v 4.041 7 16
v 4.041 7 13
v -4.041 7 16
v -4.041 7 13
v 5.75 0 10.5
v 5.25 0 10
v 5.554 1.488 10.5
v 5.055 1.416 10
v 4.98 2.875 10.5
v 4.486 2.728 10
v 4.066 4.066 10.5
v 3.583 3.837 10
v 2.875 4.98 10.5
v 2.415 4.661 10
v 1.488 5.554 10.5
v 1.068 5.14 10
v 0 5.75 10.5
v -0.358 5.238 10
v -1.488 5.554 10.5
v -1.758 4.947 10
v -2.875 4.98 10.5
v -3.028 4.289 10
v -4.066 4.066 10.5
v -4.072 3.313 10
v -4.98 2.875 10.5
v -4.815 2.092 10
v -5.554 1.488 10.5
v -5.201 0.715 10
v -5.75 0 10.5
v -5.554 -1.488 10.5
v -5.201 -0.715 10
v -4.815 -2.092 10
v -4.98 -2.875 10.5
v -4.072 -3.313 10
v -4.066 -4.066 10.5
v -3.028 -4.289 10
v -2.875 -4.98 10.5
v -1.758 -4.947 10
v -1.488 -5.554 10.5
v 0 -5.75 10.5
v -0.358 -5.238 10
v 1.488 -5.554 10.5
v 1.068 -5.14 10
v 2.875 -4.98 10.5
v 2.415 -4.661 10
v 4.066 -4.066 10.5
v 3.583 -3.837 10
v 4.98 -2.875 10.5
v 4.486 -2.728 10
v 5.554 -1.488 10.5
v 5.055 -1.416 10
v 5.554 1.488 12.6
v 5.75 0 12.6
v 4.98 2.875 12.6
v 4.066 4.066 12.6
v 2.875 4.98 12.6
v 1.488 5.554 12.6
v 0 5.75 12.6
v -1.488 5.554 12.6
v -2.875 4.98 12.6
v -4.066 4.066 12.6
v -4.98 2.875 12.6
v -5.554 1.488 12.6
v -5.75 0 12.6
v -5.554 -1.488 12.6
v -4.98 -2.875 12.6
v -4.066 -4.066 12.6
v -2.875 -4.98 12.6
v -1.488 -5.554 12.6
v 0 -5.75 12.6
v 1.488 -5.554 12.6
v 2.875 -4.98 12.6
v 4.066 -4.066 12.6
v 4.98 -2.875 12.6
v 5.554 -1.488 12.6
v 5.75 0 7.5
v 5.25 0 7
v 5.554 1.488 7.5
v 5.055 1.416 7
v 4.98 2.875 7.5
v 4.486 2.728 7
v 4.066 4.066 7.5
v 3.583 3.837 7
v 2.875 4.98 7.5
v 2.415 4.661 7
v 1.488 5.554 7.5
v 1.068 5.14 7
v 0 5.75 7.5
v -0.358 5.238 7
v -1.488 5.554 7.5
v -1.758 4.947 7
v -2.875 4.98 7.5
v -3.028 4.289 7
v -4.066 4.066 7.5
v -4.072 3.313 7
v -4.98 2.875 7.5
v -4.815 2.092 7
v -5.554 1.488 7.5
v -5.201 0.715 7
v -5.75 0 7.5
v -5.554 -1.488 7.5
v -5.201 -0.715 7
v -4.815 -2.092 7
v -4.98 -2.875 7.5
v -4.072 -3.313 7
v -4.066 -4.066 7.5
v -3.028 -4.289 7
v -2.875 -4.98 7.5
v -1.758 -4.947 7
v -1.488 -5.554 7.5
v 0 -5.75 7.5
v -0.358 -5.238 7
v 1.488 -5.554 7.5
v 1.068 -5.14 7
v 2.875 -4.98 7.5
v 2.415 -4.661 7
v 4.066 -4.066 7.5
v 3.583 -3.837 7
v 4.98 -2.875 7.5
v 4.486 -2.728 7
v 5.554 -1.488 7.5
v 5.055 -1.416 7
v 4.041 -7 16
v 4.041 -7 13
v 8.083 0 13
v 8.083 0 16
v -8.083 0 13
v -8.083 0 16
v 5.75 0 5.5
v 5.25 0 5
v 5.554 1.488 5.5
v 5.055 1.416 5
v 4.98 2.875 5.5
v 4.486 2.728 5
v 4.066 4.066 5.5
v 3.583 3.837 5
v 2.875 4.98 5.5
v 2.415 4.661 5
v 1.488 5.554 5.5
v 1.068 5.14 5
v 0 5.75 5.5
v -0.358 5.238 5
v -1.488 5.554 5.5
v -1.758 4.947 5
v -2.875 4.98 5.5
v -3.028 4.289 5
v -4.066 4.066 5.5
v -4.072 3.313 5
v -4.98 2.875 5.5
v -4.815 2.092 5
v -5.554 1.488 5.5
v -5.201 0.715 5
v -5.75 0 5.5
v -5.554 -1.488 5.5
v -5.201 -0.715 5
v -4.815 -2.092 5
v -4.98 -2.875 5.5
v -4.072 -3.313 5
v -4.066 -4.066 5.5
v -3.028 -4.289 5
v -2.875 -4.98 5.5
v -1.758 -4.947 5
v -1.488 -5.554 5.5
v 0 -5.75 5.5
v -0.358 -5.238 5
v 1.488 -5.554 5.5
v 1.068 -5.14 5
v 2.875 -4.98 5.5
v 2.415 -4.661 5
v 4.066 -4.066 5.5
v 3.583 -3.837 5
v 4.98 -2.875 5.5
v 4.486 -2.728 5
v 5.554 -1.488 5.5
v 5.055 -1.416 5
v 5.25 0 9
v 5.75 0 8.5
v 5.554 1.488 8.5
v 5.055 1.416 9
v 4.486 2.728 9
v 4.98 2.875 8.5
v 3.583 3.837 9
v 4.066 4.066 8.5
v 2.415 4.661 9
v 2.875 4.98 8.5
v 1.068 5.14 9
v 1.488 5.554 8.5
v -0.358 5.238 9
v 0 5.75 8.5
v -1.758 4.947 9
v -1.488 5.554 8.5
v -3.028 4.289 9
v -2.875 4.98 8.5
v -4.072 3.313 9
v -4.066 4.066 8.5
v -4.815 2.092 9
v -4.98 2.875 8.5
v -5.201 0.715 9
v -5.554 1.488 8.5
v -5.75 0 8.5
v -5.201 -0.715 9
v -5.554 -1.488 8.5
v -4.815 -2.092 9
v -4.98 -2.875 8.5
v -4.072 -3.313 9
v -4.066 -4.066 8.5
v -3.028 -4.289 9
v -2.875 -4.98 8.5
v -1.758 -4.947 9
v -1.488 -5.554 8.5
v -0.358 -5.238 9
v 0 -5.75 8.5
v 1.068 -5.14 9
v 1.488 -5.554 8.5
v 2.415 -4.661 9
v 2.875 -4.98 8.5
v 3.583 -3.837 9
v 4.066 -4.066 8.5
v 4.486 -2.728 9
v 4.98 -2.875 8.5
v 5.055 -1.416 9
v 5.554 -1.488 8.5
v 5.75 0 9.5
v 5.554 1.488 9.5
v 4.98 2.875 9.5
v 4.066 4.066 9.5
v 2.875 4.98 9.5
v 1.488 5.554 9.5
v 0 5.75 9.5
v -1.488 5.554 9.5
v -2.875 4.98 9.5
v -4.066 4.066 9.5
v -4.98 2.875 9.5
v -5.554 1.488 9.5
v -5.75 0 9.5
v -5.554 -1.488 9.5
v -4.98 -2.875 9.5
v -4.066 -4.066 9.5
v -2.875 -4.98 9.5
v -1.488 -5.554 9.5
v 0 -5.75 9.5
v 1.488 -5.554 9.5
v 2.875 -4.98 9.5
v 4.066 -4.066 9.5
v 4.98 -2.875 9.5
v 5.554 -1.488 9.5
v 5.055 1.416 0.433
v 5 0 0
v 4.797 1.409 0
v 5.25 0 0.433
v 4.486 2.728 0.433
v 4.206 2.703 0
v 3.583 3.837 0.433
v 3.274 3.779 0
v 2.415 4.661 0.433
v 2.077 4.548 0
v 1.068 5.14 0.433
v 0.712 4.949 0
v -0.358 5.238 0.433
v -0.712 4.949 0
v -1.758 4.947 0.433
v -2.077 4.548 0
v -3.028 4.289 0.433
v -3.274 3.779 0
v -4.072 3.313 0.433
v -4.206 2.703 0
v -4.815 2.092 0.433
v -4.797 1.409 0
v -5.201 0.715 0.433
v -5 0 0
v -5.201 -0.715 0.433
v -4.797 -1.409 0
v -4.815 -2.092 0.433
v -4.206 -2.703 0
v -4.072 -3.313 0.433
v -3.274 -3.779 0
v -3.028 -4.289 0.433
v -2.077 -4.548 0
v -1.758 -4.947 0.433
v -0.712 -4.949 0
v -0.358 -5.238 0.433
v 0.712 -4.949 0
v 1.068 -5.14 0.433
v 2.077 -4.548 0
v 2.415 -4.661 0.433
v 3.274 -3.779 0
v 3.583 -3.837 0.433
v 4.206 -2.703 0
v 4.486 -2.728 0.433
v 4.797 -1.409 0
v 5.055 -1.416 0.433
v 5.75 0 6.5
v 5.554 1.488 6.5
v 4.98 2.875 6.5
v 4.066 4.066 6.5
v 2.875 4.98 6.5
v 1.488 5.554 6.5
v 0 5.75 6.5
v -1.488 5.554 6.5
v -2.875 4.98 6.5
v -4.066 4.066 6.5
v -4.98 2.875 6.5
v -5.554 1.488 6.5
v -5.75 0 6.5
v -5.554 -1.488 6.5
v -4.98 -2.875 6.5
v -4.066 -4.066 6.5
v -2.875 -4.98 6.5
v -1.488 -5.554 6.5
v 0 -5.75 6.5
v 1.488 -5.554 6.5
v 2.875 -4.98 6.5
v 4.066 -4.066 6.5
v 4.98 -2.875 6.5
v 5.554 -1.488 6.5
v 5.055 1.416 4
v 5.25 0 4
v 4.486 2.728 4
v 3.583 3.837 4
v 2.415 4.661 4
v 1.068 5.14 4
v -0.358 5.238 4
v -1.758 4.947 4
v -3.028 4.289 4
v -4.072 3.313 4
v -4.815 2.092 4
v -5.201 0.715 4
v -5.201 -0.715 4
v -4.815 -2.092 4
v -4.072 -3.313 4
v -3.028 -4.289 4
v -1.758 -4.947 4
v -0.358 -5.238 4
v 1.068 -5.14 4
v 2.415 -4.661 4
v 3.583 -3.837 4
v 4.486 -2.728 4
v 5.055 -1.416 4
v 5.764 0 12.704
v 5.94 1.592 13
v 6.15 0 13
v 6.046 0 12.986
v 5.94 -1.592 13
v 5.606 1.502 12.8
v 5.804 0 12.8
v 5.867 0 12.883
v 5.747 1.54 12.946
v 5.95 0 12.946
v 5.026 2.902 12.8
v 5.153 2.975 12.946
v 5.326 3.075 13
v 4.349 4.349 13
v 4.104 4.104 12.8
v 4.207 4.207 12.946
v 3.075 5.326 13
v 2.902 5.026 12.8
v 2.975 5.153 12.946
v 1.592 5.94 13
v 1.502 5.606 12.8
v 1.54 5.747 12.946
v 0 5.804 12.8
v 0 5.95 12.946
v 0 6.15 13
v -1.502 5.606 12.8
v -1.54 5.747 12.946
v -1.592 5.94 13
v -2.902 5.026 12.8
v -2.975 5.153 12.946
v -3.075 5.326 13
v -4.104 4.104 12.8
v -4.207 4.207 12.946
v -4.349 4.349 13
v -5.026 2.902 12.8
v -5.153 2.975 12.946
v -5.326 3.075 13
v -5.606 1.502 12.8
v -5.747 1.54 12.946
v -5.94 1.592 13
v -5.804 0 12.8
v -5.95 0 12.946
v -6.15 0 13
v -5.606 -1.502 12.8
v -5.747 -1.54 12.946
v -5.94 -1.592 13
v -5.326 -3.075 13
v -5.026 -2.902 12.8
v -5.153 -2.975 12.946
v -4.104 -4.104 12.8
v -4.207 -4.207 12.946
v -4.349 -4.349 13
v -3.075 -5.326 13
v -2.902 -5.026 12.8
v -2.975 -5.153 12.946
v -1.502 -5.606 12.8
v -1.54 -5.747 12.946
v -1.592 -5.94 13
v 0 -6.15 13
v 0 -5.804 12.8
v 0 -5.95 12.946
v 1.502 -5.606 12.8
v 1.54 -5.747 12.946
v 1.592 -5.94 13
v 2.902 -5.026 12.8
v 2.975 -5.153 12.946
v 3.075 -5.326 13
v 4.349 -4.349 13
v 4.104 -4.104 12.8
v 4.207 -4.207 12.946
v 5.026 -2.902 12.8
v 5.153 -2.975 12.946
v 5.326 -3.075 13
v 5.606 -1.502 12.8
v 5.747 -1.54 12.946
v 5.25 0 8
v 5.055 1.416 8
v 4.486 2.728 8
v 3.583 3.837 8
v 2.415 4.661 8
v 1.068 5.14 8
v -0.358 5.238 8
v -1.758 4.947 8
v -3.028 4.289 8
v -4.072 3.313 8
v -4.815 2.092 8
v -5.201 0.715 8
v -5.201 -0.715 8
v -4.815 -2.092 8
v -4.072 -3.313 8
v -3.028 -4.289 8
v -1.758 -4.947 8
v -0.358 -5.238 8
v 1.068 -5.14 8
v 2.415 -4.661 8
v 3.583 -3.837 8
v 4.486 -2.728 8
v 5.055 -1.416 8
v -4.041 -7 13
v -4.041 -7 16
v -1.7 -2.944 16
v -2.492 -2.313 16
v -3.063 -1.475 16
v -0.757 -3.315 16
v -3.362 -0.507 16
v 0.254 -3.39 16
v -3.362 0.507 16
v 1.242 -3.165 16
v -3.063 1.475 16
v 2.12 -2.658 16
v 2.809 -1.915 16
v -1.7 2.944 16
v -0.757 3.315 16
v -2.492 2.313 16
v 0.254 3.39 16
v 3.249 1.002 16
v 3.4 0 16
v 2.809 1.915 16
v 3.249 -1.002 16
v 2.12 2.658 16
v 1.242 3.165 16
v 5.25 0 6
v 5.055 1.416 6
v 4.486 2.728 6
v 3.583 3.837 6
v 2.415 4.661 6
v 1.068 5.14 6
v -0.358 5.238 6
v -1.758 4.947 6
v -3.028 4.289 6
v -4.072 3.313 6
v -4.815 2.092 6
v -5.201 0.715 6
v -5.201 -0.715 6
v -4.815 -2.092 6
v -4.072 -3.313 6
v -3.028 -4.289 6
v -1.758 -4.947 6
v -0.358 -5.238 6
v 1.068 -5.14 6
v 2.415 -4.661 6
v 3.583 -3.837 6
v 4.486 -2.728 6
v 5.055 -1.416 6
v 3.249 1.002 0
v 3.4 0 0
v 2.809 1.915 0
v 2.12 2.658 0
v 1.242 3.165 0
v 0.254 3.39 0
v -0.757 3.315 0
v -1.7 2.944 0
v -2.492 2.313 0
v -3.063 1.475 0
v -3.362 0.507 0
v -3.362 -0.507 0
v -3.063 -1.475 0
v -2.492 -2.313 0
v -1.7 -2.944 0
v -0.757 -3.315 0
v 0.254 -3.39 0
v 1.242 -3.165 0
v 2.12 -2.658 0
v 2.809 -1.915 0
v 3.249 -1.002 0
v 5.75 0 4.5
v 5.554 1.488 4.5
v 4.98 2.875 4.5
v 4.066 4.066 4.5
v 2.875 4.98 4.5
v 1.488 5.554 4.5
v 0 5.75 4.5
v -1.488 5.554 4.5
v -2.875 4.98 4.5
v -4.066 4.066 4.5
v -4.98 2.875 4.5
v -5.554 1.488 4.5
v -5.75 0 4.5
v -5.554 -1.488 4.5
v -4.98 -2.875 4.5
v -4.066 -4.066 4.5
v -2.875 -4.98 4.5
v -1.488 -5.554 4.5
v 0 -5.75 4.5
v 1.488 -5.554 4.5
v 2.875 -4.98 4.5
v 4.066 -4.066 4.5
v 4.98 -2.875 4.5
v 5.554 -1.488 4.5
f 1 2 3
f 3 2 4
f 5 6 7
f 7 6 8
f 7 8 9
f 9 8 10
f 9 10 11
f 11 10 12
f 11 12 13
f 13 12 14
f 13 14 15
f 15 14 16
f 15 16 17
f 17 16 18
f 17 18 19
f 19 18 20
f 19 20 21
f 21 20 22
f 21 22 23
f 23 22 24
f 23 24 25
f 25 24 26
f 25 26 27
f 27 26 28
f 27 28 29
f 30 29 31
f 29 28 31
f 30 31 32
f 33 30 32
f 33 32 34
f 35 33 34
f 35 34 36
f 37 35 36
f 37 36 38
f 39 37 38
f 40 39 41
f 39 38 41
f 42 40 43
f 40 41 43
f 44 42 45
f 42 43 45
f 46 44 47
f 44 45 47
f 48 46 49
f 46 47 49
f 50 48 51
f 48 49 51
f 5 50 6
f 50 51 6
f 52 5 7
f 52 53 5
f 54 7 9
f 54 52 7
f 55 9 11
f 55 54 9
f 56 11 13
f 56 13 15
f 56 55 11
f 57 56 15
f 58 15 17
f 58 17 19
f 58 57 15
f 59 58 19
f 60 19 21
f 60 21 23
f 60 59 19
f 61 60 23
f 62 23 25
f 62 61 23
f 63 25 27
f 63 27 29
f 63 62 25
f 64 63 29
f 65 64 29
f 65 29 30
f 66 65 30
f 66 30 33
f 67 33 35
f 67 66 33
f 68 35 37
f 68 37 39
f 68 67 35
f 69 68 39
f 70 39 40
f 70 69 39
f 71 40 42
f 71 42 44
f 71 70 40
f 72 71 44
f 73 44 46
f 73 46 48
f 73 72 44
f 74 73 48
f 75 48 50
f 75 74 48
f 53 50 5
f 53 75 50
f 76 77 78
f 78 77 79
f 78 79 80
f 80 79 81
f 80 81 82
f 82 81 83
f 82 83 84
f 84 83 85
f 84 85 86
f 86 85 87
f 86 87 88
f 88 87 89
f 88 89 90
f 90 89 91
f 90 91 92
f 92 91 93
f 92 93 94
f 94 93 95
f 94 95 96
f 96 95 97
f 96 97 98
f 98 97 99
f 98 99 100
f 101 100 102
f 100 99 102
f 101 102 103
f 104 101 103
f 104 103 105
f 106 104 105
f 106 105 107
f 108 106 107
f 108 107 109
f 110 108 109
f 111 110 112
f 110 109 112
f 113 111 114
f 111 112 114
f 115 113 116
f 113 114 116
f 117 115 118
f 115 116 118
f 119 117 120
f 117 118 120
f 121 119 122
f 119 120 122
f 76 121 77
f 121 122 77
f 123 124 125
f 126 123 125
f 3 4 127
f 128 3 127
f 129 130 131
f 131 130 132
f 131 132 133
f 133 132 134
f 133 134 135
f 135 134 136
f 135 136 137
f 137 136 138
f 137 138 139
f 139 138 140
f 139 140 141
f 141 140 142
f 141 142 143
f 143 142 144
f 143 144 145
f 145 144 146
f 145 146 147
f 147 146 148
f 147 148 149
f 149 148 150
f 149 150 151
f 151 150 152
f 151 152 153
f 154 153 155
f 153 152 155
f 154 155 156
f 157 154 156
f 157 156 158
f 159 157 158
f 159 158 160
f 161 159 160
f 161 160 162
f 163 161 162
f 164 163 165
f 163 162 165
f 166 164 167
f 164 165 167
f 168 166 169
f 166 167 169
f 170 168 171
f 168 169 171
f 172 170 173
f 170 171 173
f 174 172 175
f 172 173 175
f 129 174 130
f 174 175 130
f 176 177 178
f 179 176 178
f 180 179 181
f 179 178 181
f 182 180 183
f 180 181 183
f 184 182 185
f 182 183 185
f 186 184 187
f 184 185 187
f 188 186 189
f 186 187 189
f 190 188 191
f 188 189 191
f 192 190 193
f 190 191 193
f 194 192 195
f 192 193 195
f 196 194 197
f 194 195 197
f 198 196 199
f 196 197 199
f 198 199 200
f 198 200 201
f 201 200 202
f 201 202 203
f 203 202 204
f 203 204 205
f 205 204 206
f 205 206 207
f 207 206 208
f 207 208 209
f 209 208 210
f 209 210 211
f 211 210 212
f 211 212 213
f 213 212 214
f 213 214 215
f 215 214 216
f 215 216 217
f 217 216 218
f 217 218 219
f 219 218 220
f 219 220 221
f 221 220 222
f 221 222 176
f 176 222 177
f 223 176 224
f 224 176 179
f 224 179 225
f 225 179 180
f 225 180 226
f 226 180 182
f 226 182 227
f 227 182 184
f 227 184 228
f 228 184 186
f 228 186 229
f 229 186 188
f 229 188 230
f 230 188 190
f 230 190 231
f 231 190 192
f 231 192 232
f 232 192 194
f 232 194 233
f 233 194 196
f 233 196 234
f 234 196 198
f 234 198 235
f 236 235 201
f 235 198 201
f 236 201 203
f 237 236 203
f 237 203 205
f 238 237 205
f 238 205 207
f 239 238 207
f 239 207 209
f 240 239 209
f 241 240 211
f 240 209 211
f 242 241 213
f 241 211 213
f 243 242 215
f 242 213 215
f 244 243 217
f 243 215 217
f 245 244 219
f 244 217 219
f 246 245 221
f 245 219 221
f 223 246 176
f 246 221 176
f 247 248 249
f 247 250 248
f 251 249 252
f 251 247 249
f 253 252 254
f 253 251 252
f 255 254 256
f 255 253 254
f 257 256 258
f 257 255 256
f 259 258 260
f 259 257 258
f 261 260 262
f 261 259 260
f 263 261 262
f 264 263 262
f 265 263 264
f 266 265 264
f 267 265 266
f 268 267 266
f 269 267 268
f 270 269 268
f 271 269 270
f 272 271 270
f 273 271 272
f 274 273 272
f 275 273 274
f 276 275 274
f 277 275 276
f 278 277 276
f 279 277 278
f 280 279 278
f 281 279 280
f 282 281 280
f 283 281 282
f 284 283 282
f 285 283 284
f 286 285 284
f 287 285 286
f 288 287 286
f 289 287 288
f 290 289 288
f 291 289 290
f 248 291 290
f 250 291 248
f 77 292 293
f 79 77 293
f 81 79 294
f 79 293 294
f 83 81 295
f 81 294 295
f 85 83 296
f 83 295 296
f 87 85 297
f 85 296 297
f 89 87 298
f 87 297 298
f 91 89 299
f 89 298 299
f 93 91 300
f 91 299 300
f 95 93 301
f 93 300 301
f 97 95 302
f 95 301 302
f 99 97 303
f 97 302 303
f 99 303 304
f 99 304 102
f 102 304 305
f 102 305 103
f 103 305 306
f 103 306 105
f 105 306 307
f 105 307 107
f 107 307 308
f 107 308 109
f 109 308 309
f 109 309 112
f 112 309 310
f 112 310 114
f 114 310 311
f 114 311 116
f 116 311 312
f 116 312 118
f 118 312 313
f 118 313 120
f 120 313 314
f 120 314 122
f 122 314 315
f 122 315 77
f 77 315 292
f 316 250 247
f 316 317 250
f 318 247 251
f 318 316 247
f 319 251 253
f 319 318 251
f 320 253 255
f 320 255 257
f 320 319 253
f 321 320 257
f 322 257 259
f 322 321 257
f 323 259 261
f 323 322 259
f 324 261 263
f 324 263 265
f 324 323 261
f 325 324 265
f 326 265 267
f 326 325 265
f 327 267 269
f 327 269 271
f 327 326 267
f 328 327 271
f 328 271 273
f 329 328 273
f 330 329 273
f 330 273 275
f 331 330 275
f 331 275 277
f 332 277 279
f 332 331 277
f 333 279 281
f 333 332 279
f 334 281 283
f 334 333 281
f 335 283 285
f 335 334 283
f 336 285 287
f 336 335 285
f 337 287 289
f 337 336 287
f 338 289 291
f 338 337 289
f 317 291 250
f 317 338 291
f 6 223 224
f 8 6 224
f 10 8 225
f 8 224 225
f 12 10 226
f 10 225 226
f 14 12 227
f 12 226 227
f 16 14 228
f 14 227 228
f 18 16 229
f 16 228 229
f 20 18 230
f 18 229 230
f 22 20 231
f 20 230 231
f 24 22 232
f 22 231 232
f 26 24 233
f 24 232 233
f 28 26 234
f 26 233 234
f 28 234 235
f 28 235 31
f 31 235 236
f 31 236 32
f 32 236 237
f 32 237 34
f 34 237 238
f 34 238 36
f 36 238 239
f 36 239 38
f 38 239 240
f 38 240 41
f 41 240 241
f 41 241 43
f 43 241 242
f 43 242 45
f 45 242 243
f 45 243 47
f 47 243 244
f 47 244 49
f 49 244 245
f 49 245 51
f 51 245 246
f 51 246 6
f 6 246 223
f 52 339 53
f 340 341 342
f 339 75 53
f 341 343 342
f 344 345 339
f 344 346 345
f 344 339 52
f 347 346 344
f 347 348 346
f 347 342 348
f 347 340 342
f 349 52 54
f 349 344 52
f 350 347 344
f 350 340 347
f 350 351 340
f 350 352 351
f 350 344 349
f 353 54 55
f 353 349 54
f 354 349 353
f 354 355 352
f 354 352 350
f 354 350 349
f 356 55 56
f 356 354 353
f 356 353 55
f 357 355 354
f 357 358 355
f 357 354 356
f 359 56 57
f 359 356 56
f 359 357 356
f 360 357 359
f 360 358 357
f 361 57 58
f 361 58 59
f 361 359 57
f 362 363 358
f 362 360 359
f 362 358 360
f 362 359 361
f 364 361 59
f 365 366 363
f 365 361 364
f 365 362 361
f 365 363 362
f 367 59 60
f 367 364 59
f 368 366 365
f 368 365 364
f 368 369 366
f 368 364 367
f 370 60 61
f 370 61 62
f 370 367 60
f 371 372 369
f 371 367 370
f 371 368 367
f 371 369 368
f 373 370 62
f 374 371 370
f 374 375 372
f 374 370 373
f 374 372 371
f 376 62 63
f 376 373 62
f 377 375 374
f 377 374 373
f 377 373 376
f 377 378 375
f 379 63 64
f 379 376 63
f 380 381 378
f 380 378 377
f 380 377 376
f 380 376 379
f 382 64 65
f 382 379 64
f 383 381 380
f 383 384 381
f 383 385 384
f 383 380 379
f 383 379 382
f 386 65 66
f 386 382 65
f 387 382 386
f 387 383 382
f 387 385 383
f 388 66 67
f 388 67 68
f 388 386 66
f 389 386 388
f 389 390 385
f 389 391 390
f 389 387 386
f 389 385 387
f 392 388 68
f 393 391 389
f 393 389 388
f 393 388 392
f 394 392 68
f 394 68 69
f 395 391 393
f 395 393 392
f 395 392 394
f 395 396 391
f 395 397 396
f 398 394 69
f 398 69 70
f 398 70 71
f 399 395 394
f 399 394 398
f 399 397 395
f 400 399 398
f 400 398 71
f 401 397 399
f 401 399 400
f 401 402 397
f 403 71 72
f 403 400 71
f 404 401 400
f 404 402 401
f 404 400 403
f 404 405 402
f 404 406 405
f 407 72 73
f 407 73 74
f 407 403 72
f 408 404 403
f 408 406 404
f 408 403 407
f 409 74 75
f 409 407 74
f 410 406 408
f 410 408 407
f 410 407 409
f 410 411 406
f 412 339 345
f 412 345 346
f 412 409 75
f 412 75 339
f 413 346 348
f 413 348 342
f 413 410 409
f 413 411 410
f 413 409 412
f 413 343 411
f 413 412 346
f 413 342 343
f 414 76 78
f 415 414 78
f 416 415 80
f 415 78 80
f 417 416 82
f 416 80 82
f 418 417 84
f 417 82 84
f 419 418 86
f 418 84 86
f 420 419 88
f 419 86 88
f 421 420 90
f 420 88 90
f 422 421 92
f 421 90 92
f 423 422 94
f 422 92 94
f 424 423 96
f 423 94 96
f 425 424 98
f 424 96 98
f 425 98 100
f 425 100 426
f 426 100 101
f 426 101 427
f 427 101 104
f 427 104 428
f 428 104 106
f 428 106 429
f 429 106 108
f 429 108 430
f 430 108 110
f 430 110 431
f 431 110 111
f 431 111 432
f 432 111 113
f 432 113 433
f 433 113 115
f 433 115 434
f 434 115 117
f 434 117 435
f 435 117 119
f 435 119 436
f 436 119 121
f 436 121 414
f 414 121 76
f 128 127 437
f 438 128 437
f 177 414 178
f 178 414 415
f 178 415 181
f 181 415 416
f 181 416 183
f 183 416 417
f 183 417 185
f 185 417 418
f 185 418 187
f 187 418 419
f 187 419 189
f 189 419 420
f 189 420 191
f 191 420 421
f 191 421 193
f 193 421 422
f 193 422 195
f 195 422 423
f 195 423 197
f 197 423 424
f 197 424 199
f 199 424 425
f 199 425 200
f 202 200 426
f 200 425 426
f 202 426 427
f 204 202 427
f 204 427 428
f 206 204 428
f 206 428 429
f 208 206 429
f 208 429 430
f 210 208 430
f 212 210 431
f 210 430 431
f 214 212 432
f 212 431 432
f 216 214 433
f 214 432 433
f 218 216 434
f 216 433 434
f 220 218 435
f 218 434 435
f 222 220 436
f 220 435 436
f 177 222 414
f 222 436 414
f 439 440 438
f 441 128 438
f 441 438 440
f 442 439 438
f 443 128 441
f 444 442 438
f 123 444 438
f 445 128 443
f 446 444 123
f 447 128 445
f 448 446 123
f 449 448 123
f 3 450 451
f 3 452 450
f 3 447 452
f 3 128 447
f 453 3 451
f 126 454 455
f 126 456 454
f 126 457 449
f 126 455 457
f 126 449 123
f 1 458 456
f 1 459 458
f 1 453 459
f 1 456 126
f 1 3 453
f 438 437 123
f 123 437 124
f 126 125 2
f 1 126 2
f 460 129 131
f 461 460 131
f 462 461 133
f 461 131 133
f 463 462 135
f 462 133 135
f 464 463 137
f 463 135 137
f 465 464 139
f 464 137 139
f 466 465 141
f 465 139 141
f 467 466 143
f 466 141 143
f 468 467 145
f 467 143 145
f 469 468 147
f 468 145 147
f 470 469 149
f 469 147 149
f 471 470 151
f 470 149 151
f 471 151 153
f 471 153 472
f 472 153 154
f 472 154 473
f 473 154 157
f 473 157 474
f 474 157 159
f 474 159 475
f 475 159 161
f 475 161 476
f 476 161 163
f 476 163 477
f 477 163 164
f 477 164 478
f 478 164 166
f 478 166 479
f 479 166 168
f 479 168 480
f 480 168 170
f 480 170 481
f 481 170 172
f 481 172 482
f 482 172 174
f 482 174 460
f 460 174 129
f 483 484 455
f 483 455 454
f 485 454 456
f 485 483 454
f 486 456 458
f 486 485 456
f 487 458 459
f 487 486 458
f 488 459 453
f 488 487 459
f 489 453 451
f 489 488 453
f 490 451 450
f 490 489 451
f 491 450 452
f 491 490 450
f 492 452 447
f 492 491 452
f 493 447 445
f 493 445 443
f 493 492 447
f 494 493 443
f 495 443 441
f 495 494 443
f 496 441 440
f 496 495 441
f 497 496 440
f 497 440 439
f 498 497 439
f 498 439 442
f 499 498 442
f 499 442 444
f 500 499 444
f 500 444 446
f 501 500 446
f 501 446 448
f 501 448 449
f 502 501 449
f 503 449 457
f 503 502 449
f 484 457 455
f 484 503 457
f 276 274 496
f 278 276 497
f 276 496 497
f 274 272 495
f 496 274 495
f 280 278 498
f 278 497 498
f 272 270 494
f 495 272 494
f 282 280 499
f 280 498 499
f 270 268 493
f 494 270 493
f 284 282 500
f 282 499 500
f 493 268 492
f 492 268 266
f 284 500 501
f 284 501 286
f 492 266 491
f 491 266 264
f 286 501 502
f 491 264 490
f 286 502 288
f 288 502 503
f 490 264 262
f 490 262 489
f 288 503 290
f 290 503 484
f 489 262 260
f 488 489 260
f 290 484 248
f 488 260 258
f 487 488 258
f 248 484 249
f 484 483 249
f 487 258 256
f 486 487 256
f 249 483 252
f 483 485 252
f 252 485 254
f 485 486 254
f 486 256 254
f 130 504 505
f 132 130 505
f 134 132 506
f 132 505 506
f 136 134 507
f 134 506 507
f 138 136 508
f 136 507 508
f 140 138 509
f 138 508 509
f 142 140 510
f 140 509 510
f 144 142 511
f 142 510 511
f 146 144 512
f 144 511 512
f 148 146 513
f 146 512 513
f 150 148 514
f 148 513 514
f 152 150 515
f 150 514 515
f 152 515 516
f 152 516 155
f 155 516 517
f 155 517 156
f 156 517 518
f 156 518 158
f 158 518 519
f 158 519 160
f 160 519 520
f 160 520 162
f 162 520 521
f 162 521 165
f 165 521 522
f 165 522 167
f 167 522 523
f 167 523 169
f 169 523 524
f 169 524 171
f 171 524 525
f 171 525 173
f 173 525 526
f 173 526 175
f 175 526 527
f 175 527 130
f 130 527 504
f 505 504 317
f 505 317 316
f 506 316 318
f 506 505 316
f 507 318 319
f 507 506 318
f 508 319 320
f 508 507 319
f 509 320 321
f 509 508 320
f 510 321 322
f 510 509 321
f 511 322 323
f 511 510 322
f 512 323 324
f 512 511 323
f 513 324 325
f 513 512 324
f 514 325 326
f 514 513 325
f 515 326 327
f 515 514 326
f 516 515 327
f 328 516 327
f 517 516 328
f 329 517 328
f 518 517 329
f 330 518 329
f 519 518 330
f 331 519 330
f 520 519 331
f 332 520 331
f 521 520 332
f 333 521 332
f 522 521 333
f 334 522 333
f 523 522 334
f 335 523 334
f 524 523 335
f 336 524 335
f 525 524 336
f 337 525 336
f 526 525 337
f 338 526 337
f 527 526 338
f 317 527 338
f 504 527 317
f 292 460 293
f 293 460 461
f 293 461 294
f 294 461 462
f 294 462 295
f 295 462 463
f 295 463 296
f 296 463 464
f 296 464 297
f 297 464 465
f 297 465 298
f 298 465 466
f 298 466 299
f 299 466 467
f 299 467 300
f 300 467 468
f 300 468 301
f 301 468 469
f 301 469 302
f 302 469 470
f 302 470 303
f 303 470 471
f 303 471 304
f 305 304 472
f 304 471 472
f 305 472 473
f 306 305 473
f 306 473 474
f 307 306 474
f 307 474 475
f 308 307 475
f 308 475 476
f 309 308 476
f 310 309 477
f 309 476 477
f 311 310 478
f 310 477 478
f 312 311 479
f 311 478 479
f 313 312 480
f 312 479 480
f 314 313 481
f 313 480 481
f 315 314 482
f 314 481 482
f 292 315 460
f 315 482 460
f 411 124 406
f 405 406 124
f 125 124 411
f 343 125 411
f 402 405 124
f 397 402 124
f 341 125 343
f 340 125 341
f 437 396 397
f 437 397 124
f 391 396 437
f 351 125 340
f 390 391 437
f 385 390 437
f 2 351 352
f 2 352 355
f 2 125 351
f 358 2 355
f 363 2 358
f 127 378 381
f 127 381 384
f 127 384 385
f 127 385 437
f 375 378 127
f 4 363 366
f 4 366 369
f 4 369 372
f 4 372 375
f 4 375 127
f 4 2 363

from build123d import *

# Parameters (mm, degrees)
SKETCH1_R       = 3.4
EXTRUDE1_DEPTH  = 16
LPATTERN2_COUNT = 6
LPATTERN2_PITCH = 1


with BuildPart() as part:
    # Sketch1 → Extrude1 (new body)
    with BuildSketch(Plane.XY):
        Polygon((8.082903769, 0), (4.041451884, 7), (-4.041451884, 7), (-8.082903769, 0), (-4.041451884, -7), (4.041451884, -7), align=None)
        Circle(SKETCH1_R, mode=Mode.SUBTRACT)
    extrude(amount=EXTRUDE1_DEPTH)

    # Sketch2 → Cut-Revolve1 (revolve, cut)
    with BuildSketch(Plane(origin=(0, 0, 0), x_dir=(1, 0, 0), z_dir=(0, 1, 0))):
        with BuildLine():
            Line((5.75, -4.5), (5.75, -12.6))
            ThreePointArc((5.75, -12.6), (5.867157288, -12.882842712), (6.15, -13))
            Line((6.15, -13), (8.082903769, -13))
            Line((8.082903769, -13), (8.082903769, 0))
            Line((8.082903769, 0), (5, 0))
            Line((5, 0), (5.25, -0.433012702))
            Line((5.25, -0.433012702), (5.25, -4))
            Line((5.25, -4), (5.75, -4.5))
        make_face()
    revolve(axis=Axis((0, 0, 0), (0, 0, 1)), mode=Mode.SUBTRACT)

    # Sketch4 → Cut-Revolve2 (revolve, cut)
    with BuildSketch(Plane(origin=(0, 0, 0), x_dir=(1, 0, 0), z_dir=(0, 1, 0))):
        Polygon((5.75, -4.5), (5.75, -5.5), (5.25, -5), align=None)
    cut_revolve2 = revolve(axis=Axis((0, 0, 0), (0, 0, 1)), mode=Mode.SUBTRACT)

    # LPattern2: Cut-Revolve2 ×6
    with Locations(*[(0, 0, i * LPATTERN2_PITCH) for i in range(1, LPATTERN2_COUNT)]):
        add(cut_revolve2, mode=Mode.SUBTRACT)


solid = part.part
